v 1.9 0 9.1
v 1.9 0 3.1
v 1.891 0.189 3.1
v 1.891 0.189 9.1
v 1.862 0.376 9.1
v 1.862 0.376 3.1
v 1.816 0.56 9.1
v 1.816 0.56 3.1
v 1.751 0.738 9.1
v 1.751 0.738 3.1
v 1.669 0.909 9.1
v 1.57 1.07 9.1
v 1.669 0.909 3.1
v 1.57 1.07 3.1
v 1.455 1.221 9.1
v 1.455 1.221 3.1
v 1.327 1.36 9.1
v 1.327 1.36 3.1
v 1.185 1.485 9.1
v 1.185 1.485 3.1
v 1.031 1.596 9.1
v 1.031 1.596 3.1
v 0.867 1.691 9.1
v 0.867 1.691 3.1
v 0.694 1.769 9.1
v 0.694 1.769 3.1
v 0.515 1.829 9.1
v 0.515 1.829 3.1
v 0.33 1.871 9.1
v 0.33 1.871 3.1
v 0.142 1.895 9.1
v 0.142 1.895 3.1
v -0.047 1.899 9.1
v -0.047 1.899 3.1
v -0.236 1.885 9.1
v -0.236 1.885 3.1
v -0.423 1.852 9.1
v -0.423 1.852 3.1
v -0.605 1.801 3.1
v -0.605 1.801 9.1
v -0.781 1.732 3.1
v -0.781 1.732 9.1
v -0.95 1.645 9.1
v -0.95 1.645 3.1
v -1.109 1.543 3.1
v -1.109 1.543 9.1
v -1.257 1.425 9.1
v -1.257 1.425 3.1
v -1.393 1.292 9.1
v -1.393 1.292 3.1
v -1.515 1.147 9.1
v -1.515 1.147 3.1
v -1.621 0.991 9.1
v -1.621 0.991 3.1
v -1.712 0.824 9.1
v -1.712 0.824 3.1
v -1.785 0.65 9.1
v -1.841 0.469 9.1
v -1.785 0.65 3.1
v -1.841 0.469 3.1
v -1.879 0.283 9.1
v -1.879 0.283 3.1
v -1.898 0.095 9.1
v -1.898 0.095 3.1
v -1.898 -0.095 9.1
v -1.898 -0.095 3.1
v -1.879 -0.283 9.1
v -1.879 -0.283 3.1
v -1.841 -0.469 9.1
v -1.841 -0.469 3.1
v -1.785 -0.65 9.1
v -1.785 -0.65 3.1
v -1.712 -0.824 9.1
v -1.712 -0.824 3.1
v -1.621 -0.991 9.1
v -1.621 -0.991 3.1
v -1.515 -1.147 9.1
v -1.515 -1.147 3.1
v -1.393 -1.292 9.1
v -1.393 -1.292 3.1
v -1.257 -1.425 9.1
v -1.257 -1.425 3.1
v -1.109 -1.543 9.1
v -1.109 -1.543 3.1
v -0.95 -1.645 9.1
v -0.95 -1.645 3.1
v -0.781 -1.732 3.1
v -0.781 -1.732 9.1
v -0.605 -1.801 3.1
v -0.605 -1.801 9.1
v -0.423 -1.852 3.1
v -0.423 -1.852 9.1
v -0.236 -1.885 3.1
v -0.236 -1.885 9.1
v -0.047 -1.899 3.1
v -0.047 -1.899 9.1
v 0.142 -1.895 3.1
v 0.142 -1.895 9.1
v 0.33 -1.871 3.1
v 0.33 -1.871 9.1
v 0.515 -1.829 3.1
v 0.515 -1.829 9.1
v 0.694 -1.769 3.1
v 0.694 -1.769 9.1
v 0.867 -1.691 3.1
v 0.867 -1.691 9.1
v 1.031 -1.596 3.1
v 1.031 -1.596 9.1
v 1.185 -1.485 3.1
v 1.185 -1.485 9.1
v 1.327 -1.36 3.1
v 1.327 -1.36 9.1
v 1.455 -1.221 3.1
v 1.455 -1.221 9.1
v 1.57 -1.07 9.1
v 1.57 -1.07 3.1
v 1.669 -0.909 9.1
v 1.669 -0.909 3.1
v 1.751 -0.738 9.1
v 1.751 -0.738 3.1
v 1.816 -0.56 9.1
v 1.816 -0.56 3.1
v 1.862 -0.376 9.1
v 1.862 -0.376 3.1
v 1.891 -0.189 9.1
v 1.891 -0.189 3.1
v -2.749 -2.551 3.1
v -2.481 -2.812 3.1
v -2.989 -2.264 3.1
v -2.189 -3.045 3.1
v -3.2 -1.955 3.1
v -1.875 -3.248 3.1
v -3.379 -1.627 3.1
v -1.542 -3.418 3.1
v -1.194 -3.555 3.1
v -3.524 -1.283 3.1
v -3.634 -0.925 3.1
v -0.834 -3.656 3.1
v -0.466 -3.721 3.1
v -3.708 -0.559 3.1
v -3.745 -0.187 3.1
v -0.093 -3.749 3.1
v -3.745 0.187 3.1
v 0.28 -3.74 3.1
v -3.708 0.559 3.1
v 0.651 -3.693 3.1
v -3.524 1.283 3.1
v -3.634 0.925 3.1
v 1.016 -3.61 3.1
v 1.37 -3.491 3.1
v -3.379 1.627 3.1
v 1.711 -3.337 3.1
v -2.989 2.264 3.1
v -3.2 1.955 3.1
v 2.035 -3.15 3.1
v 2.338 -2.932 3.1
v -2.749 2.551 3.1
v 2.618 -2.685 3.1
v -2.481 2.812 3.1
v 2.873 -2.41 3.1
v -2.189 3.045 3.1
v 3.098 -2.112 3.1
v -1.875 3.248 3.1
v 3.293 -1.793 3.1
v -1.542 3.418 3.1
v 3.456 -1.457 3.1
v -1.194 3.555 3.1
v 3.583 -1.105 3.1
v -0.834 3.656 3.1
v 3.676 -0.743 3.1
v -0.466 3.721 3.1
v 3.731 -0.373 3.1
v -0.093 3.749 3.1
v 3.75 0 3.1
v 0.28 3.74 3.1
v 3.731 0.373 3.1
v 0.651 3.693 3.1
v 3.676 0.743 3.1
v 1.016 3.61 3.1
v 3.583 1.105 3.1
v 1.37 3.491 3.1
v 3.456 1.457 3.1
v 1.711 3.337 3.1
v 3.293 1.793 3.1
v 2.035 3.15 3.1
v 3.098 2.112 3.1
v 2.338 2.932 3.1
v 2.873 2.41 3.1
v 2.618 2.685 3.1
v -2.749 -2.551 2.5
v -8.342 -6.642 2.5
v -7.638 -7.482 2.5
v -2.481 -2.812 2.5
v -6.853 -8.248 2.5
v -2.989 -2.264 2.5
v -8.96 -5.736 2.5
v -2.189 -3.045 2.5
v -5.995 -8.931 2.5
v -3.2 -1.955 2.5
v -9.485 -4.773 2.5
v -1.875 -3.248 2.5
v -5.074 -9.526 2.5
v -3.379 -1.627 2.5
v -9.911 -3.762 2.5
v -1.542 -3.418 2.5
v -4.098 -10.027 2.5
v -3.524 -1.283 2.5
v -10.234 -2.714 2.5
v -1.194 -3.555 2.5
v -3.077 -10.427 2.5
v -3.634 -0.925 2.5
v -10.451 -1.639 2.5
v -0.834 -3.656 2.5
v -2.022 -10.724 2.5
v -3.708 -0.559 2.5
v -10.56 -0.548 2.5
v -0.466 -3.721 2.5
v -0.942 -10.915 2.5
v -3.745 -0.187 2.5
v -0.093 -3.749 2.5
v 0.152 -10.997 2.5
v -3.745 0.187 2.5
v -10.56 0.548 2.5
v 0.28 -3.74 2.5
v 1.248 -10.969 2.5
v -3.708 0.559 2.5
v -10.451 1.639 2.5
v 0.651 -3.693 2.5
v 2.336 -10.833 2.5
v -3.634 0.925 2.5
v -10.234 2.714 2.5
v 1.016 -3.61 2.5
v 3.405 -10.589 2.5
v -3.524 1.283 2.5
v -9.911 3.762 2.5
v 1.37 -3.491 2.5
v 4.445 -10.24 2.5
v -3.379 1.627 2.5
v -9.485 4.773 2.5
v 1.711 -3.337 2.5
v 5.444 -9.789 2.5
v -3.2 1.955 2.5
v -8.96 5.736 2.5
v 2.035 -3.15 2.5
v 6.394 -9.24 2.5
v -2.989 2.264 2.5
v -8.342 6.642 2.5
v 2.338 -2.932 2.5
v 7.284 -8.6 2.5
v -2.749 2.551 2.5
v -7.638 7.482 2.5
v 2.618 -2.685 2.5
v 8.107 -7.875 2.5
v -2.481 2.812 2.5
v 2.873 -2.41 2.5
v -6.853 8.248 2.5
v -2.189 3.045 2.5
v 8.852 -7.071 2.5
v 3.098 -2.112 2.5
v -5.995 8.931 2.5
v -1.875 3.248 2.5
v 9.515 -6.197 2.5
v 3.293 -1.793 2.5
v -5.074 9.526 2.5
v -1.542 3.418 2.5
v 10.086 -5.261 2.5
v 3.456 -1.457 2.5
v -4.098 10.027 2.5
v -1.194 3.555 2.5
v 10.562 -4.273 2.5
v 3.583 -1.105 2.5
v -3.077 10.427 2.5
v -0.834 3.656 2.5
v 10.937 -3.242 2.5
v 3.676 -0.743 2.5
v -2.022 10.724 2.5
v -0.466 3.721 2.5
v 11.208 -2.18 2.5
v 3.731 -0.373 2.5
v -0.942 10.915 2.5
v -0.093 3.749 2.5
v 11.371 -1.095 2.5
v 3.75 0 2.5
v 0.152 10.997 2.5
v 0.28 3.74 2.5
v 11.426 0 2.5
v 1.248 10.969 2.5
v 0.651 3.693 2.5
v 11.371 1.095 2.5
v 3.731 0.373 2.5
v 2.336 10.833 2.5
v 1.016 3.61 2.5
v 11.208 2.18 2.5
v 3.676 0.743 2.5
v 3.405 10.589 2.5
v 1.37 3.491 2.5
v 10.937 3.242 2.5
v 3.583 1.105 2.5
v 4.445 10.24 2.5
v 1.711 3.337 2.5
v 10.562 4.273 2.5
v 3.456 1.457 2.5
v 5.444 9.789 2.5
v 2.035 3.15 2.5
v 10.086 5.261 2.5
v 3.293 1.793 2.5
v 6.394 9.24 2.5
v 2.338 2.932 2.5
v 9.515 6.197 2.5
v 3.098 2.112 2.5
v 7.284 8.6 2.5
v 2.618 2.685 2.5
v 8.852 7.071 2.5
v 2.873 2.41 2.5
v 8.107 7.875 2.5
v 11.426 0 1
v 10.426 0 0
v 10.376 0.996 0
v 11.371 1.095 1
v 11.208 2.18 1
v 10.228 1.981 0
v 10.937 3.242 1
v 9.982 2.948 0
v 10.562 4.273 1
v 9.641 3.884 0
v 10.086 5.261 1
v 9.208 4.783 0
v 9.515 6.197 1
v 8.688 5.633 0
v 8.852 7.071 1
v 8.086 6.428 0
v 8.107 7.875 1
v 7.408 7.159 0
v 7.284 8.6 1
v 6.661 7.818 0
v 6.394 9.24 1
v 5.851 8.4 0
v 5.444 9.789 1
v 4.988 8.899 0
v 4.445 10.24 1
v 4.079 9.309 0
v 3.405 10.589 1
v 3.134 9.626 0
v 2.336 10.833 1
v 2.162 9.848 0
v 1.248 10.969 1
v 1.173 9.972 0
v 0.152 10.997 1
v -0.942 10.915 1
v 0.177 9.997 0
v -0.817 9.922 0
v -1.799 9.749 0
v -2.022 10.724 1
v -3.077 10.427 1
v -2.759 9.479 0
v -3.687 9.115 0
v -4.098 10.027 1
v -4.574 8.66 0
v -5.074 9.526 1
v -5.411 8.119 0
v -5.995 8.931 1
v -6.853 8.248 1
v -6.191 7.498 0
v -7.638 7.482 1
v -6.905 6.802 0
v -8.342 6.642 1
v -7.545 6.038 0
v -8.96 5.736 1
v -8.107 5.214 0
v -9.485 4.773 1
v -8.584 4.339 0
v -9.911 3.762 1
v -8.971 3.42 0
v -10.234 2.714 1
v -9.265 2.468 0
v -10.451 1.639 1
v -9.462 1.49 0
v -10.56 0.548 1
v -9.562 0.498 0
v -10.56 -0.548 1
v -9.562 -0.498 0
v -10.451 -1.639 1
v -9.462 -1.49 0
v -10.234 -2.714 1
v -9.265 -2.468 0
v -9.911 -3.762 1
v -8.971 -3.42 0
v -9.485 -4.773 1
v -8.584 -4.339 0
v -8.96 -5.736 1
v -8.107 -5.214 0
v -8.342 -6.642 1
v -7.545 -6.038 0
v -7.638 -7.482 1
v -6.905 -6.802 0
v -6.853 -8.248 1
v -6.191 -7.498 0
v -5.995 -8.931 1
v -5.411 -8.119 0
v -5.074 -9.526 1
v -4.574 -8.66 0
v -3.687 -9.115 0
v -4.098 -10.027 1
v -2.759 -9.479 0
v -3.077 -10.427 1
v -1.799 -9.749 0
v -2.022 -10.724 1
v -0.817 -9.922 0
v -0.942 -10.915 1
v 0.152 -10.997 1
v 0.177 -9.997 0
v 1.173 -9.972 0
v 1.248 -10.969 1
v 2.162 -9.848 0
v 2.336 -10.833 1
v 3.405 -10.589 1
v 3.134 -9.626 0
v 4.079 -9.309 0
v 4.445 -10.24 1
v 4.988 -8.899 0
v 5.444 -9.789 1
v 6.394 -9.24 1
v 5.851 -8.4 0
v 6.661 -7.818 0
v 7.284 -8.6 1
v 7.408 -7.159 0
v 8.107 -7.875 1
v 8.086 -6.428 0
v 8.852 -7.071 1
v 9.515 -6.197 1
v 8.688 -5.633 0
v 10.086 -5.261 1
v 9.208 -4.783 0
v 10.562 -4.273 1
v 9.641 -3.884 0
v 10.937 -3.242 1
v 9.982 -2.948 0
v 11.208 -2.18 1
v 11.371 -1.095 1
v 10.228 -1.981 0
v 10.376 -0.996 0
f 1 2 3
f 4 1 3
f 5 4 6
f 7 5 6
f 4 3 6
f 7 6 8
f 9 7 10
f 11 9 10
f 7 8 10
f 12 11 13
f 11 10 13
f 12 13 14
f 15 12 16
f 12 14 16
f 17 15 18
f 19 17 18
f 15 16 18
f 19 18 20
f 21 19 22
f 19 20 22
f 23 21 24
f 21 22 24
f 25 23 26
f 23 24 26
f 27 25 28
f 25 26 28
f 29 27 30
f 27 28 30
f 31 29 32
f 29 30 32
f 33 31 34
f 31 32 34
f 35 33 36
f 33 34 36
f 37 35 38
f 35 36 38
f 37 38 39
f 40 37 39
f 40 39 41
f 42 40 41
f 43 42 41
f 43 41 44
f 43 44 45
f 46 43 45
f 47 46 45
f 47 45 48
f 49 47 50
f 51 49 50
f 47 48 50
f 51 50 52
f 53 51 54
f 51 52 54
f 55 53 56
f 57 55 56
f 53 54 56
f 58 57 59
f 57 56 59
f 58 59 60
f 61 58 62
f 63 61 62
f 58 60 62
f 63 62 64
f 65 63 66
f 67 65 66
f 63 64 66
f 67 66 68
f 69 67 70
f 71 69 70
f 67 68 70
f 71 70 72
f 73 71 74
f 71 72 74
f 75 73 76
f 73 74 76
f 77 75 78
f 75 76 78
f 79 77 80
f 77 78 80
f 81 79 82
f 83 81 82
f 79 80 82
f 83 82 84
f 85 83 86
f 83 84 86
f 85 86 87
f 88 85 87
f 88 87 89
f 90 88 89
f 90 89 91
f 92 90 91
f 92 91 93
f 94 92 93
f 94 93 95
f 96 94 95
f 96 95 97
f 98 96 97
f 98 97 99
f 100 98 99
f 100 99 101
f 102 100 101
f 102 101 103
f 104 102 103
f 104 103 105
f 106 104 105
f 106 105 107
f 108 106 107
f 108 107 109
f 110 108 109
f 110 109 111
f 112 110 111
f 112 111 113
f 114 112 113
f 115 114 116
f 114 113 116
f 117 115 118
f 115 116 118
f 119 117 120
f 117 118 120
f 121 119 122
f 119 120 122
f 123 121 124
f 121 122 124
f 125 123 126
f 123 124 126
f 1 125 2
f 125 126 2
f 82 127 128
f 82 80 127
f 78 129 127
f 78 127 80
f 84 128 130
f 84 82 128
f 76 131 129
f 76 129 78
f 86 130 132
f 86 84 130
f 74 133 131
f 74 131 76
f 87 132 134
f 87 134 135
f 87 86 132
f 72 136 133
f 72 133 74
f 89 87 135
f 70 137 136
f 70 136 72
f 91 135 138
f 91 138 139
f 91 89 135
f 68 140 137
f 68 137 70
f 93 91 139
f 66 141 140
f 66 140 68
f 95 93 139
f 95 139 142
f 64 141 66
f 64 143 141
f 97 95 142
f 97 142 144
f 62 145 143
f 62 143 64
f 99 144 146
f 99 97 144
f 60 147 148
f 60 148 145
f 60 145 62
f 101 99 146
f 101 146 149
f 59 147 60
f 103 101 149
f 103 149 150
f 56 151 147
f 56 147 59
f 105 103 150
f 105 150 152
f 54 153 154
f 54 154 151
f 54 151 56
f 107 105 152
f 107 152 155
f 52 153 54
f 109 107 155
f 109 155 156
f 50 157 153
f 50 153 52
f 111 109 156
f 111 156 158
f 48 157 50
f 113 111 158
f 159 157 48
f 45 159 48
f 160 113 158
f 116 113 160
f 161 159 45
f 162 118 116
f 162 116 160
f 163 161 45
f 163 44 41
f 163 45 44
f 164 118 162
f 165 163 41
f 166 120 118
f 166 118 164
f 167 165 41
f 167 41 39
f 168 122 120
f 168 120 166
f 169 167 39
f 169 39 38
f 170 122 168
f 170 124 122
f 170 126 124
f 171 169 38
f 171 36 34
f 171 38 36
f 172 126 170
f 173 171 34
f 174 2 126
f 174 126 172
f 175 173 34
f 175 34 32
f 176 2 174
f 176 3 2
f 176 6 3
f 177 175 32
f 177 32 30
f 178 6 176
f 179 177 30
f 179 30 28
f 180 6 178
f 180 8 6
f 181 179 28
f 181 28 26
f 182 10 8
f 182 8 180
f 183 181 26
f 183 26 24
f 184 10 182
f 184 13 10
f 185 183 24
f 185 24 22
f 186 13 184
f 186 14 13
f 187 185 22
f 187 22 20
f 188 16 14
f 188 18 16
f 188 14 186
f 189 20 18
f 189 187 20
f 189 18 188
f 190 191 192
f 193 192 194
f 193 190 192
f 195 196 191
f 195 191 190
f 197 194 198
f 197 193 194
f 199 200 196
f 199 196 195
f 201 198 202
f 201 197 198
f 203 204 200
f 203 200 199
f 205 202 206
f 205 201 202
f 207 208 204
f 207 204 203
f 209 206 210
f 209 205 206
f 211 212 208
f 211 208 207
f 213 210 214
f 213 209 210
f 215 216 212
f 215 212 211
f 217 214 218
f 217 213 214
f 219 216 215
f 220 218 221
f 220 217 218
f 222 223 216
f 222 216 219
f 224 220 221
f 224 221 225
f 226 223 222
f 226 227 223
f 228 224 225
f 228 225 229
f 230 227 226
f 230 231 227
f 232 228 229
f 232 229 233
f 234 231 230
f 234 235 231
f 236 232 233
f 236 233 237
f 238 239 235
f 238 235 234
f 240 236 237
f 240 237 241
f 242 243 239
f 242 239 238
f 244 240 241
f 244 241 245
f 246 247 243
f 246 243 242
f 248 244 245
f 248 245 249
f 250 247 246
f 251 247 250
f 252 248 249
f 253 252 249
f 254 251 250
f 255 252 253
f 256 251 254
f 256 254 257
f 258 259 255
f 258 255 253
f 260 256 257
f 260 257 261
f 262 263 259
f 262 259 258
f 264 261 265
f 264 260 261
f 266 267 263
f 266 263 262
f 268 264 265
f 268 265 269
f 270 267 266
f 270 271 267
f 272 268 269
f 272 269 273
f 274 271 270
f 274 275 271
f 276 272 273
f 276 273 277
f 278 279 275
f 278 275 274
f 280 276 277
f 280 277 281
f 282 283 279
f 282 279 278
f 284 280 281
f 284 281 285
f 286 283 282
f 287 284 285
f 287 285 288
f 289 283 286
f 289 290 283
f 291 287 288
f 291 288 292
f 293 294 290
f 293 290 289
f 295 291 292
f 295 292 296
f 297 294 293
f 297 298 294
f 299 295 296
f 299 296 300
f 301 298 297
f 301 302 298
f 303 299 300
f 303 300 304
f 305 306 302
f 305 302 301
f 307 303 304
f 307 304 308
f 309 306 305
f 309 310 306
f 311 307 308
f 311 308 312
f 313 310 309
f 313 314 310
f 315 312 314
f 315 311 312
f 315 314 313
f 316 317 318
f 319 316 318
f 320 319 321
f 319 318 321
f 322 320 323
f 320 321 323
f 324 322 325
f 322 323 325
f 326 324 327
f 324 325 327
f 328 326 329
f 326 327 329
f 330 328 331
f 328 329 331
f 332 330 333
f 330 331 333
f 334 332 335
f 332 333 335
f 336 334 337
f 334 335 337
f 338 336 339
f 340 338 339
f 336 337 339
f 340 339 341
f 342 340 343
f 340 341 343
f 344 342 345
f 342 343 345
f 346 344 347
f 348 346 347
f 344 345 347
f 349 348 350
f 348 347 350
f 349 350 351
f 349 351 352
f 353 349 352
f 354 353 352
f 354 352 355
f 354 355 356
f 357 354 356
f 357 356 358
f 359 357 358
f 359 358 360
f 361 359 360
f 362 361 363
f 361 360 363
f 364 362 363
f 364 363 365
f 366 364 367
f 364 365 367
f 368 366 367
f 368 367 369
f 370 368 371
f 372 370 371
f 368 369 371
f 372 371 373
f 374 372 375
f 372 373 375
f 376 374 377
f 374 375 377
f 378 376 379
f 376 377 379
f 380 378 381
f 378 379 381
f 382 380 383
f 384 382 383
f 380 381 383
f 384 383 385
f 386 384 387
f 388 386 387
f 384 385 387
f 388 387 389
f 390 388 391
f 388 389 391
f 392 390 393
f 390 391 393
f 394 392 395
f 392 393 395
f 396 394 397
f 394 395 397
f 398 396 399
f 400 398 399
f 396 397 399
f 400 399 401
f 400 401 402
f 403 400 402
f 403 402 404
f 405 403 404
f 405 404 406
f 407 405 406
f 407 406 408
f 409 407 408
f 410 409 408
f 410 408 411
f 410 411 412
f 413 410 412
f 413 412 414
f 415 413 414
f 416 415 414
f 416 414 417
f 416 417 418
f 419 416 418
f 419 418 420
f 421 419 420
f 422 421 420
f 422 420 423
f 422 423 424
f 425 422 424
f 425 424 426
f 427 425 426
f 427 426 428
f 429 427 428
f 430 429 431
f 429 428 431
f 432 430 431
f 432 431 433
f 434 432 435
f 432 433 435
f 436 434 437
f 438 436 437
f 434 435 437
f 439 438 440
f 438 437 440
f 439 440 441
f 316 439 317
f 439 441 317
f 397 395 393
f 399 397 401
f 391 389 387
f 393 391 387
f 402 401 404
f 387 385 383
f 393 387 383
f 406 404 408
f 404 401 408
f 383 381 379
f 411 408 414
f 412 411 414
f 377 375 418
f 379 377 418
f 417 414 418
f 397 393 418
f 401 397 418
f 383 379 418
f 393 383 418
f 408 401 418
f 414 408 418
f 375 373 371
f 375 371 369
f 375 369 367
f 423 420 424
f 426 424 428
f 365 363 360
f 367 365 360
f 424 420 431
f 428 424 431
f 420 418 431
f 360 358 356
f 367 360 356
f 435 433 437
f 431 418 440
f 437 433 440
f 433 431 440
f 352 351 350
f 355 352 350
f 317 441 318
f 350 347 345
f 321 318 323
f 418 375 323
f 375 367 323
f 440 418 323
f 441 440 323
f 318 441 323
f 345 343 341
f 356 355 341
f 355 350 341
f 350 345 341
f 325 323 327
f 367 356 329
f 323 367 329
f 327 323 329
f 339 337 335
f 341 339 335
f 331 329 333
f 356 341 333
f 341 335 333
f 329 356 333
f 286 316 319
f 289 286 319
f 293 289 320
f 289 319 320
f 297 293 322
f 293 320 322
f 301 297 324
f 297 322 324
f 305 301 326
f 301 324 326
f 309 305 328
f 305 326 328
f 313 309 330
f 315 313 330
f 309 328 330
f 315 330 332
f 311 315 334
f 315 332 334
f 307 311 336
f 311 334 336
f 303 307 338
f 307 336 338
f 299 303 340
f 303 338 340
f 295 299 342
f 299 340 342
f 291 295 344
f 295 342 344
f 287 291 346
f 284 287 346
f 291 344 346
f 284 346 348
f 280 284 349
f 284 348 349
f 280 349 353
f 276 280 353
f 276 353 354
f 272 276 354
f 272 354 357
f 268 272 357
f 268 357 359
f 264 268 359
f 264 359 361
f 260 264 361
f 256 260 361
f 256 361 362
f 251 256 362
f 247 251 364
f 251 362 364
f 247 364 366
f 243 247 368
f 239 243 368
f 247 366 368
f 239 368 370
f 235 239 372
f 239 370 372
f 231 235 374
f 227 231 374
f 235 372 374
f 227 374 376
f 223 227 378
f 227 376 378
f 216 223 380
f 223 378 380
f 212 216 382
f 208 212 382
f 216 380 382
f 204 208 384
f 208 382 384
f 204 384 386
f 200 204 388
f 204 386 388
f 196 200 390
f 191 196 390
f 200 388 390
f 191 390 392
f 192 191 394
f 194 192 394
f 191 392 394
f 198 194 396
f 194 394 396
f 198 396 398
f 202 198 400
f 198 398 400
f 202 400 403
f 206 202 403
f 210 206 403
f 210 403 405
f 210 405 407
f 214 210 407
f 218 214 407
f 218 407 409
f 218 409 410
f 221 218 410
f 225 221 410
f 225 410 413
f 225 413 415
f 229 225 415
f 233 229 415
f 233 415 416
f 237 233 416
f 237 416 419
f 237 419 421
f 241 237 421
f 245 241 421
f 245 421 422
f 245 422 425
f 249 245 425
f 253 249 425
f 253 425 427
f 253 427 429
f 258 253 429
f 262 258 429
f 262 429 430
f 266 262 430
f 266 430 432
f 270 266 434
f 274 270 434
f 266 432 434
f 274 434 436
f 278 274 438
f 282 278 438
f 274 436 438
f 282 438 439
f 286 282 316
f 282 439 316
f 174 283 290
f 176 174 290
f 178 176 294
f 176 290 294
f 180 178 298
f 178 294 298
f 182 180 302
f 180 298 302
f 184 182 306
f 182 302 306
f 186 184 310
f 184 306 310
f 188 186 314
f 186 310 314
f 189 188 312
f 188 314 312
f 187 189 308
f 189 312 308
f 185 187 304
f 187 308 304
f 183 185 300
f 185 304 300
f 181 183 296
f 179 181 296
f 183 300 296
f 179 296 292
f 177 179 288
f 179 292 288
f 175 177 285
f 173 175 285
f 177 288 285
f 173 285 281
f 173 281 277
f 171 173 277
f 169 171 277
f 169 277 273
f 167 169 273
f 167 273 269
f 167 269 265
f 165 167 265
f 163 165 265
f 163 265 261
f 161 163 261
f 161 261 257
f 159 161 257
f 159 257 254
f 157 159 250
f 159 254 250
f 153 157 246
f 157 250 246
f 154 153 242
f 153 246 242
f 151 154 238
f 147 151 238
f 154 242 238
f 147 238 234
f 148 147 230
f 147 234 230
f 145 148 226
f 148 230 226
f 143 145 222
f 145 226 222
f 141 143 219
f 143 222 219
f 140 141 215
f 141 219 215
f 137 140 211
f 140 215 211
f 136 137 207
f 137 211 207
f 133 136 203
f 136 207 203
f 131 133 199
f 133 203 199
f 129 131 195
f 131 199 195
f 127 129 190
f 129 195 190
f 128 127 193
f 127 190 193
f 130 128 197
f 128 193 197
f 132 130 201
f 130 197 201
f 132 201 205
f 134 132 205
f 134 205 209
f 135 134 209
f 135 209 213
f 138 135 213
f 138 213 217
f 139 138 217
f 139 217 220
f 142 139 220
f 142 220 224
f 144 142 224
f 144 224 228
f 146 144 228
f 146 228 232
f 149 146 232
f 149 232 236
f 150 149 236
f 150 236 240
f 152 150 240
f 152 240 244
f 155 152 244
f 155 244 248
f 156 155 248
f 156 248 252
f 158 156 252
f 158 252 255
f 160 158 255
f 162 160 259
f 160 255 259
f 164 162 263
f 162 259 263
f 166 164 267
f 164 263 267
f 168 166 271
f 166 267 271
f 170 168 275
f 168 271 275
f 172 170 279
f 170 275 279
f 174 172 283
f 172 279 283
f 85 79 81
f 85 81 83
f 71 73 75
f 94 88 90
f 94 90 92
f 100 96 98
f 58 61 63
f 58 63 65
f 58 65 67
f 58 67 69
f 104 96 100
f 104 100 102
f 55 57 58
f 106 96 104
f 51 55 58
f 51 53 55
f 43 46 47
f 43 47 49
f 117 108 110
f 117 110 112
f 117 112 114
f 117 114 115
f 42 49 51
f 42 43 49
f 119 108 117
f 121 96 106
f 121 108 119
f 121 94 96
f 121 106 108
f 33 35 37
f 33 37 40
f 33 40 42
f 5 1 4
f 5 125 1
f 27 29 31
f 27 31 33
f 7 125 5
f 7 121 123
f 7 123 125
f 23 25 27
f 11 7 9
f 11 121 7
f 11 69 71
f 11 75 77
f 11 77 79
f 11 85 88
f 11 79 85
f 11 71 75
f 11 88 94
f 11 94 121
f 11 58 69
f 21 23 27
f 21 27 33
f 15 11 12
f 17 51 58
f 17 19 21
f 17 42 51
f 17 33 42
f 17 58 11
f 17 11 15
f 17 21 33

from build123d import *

# Parameters (mm, degrees)
F0_R     = 11
F1_DEPTH = 2.5
F2_SIZE2 = 1
F2_SIZE  = 1
F3_R     = 3.75
F4_DEPTH = 0.6
F5_R     = 1.9
F6_DEPTH = 6


with BuildPart() as f1:
    # F0 (on Top) → F1 (new body)
    with BuildSketch(Plane.XY):
        with Locations((0.425981, 0)):
            Circle(F0_R)
    extrude(amount=F1_DEPTH)

    # F2
    f2_edges = [f1.edges().sort_by_distance(p)[0] for p in [
        (-10.574019, 0, 0),
    ]]
    chamfer(f2_edges, length=F2_SIZE, length2=F2_SIZE2)

    # F3 (on face) → F4 (join)
    with BuildSketch(Plane.XY.offset(2.5)):
        Circle(F3_R)
    extrude(amount=F4_DEPTH)

    # F5 (on face) → F6 (join)
    with BuildSketch(Plane.XY.offset(3.1)):
        Circle(F5_R)
    extrude(amount=F6_DEPTH)


solid = f1.part
